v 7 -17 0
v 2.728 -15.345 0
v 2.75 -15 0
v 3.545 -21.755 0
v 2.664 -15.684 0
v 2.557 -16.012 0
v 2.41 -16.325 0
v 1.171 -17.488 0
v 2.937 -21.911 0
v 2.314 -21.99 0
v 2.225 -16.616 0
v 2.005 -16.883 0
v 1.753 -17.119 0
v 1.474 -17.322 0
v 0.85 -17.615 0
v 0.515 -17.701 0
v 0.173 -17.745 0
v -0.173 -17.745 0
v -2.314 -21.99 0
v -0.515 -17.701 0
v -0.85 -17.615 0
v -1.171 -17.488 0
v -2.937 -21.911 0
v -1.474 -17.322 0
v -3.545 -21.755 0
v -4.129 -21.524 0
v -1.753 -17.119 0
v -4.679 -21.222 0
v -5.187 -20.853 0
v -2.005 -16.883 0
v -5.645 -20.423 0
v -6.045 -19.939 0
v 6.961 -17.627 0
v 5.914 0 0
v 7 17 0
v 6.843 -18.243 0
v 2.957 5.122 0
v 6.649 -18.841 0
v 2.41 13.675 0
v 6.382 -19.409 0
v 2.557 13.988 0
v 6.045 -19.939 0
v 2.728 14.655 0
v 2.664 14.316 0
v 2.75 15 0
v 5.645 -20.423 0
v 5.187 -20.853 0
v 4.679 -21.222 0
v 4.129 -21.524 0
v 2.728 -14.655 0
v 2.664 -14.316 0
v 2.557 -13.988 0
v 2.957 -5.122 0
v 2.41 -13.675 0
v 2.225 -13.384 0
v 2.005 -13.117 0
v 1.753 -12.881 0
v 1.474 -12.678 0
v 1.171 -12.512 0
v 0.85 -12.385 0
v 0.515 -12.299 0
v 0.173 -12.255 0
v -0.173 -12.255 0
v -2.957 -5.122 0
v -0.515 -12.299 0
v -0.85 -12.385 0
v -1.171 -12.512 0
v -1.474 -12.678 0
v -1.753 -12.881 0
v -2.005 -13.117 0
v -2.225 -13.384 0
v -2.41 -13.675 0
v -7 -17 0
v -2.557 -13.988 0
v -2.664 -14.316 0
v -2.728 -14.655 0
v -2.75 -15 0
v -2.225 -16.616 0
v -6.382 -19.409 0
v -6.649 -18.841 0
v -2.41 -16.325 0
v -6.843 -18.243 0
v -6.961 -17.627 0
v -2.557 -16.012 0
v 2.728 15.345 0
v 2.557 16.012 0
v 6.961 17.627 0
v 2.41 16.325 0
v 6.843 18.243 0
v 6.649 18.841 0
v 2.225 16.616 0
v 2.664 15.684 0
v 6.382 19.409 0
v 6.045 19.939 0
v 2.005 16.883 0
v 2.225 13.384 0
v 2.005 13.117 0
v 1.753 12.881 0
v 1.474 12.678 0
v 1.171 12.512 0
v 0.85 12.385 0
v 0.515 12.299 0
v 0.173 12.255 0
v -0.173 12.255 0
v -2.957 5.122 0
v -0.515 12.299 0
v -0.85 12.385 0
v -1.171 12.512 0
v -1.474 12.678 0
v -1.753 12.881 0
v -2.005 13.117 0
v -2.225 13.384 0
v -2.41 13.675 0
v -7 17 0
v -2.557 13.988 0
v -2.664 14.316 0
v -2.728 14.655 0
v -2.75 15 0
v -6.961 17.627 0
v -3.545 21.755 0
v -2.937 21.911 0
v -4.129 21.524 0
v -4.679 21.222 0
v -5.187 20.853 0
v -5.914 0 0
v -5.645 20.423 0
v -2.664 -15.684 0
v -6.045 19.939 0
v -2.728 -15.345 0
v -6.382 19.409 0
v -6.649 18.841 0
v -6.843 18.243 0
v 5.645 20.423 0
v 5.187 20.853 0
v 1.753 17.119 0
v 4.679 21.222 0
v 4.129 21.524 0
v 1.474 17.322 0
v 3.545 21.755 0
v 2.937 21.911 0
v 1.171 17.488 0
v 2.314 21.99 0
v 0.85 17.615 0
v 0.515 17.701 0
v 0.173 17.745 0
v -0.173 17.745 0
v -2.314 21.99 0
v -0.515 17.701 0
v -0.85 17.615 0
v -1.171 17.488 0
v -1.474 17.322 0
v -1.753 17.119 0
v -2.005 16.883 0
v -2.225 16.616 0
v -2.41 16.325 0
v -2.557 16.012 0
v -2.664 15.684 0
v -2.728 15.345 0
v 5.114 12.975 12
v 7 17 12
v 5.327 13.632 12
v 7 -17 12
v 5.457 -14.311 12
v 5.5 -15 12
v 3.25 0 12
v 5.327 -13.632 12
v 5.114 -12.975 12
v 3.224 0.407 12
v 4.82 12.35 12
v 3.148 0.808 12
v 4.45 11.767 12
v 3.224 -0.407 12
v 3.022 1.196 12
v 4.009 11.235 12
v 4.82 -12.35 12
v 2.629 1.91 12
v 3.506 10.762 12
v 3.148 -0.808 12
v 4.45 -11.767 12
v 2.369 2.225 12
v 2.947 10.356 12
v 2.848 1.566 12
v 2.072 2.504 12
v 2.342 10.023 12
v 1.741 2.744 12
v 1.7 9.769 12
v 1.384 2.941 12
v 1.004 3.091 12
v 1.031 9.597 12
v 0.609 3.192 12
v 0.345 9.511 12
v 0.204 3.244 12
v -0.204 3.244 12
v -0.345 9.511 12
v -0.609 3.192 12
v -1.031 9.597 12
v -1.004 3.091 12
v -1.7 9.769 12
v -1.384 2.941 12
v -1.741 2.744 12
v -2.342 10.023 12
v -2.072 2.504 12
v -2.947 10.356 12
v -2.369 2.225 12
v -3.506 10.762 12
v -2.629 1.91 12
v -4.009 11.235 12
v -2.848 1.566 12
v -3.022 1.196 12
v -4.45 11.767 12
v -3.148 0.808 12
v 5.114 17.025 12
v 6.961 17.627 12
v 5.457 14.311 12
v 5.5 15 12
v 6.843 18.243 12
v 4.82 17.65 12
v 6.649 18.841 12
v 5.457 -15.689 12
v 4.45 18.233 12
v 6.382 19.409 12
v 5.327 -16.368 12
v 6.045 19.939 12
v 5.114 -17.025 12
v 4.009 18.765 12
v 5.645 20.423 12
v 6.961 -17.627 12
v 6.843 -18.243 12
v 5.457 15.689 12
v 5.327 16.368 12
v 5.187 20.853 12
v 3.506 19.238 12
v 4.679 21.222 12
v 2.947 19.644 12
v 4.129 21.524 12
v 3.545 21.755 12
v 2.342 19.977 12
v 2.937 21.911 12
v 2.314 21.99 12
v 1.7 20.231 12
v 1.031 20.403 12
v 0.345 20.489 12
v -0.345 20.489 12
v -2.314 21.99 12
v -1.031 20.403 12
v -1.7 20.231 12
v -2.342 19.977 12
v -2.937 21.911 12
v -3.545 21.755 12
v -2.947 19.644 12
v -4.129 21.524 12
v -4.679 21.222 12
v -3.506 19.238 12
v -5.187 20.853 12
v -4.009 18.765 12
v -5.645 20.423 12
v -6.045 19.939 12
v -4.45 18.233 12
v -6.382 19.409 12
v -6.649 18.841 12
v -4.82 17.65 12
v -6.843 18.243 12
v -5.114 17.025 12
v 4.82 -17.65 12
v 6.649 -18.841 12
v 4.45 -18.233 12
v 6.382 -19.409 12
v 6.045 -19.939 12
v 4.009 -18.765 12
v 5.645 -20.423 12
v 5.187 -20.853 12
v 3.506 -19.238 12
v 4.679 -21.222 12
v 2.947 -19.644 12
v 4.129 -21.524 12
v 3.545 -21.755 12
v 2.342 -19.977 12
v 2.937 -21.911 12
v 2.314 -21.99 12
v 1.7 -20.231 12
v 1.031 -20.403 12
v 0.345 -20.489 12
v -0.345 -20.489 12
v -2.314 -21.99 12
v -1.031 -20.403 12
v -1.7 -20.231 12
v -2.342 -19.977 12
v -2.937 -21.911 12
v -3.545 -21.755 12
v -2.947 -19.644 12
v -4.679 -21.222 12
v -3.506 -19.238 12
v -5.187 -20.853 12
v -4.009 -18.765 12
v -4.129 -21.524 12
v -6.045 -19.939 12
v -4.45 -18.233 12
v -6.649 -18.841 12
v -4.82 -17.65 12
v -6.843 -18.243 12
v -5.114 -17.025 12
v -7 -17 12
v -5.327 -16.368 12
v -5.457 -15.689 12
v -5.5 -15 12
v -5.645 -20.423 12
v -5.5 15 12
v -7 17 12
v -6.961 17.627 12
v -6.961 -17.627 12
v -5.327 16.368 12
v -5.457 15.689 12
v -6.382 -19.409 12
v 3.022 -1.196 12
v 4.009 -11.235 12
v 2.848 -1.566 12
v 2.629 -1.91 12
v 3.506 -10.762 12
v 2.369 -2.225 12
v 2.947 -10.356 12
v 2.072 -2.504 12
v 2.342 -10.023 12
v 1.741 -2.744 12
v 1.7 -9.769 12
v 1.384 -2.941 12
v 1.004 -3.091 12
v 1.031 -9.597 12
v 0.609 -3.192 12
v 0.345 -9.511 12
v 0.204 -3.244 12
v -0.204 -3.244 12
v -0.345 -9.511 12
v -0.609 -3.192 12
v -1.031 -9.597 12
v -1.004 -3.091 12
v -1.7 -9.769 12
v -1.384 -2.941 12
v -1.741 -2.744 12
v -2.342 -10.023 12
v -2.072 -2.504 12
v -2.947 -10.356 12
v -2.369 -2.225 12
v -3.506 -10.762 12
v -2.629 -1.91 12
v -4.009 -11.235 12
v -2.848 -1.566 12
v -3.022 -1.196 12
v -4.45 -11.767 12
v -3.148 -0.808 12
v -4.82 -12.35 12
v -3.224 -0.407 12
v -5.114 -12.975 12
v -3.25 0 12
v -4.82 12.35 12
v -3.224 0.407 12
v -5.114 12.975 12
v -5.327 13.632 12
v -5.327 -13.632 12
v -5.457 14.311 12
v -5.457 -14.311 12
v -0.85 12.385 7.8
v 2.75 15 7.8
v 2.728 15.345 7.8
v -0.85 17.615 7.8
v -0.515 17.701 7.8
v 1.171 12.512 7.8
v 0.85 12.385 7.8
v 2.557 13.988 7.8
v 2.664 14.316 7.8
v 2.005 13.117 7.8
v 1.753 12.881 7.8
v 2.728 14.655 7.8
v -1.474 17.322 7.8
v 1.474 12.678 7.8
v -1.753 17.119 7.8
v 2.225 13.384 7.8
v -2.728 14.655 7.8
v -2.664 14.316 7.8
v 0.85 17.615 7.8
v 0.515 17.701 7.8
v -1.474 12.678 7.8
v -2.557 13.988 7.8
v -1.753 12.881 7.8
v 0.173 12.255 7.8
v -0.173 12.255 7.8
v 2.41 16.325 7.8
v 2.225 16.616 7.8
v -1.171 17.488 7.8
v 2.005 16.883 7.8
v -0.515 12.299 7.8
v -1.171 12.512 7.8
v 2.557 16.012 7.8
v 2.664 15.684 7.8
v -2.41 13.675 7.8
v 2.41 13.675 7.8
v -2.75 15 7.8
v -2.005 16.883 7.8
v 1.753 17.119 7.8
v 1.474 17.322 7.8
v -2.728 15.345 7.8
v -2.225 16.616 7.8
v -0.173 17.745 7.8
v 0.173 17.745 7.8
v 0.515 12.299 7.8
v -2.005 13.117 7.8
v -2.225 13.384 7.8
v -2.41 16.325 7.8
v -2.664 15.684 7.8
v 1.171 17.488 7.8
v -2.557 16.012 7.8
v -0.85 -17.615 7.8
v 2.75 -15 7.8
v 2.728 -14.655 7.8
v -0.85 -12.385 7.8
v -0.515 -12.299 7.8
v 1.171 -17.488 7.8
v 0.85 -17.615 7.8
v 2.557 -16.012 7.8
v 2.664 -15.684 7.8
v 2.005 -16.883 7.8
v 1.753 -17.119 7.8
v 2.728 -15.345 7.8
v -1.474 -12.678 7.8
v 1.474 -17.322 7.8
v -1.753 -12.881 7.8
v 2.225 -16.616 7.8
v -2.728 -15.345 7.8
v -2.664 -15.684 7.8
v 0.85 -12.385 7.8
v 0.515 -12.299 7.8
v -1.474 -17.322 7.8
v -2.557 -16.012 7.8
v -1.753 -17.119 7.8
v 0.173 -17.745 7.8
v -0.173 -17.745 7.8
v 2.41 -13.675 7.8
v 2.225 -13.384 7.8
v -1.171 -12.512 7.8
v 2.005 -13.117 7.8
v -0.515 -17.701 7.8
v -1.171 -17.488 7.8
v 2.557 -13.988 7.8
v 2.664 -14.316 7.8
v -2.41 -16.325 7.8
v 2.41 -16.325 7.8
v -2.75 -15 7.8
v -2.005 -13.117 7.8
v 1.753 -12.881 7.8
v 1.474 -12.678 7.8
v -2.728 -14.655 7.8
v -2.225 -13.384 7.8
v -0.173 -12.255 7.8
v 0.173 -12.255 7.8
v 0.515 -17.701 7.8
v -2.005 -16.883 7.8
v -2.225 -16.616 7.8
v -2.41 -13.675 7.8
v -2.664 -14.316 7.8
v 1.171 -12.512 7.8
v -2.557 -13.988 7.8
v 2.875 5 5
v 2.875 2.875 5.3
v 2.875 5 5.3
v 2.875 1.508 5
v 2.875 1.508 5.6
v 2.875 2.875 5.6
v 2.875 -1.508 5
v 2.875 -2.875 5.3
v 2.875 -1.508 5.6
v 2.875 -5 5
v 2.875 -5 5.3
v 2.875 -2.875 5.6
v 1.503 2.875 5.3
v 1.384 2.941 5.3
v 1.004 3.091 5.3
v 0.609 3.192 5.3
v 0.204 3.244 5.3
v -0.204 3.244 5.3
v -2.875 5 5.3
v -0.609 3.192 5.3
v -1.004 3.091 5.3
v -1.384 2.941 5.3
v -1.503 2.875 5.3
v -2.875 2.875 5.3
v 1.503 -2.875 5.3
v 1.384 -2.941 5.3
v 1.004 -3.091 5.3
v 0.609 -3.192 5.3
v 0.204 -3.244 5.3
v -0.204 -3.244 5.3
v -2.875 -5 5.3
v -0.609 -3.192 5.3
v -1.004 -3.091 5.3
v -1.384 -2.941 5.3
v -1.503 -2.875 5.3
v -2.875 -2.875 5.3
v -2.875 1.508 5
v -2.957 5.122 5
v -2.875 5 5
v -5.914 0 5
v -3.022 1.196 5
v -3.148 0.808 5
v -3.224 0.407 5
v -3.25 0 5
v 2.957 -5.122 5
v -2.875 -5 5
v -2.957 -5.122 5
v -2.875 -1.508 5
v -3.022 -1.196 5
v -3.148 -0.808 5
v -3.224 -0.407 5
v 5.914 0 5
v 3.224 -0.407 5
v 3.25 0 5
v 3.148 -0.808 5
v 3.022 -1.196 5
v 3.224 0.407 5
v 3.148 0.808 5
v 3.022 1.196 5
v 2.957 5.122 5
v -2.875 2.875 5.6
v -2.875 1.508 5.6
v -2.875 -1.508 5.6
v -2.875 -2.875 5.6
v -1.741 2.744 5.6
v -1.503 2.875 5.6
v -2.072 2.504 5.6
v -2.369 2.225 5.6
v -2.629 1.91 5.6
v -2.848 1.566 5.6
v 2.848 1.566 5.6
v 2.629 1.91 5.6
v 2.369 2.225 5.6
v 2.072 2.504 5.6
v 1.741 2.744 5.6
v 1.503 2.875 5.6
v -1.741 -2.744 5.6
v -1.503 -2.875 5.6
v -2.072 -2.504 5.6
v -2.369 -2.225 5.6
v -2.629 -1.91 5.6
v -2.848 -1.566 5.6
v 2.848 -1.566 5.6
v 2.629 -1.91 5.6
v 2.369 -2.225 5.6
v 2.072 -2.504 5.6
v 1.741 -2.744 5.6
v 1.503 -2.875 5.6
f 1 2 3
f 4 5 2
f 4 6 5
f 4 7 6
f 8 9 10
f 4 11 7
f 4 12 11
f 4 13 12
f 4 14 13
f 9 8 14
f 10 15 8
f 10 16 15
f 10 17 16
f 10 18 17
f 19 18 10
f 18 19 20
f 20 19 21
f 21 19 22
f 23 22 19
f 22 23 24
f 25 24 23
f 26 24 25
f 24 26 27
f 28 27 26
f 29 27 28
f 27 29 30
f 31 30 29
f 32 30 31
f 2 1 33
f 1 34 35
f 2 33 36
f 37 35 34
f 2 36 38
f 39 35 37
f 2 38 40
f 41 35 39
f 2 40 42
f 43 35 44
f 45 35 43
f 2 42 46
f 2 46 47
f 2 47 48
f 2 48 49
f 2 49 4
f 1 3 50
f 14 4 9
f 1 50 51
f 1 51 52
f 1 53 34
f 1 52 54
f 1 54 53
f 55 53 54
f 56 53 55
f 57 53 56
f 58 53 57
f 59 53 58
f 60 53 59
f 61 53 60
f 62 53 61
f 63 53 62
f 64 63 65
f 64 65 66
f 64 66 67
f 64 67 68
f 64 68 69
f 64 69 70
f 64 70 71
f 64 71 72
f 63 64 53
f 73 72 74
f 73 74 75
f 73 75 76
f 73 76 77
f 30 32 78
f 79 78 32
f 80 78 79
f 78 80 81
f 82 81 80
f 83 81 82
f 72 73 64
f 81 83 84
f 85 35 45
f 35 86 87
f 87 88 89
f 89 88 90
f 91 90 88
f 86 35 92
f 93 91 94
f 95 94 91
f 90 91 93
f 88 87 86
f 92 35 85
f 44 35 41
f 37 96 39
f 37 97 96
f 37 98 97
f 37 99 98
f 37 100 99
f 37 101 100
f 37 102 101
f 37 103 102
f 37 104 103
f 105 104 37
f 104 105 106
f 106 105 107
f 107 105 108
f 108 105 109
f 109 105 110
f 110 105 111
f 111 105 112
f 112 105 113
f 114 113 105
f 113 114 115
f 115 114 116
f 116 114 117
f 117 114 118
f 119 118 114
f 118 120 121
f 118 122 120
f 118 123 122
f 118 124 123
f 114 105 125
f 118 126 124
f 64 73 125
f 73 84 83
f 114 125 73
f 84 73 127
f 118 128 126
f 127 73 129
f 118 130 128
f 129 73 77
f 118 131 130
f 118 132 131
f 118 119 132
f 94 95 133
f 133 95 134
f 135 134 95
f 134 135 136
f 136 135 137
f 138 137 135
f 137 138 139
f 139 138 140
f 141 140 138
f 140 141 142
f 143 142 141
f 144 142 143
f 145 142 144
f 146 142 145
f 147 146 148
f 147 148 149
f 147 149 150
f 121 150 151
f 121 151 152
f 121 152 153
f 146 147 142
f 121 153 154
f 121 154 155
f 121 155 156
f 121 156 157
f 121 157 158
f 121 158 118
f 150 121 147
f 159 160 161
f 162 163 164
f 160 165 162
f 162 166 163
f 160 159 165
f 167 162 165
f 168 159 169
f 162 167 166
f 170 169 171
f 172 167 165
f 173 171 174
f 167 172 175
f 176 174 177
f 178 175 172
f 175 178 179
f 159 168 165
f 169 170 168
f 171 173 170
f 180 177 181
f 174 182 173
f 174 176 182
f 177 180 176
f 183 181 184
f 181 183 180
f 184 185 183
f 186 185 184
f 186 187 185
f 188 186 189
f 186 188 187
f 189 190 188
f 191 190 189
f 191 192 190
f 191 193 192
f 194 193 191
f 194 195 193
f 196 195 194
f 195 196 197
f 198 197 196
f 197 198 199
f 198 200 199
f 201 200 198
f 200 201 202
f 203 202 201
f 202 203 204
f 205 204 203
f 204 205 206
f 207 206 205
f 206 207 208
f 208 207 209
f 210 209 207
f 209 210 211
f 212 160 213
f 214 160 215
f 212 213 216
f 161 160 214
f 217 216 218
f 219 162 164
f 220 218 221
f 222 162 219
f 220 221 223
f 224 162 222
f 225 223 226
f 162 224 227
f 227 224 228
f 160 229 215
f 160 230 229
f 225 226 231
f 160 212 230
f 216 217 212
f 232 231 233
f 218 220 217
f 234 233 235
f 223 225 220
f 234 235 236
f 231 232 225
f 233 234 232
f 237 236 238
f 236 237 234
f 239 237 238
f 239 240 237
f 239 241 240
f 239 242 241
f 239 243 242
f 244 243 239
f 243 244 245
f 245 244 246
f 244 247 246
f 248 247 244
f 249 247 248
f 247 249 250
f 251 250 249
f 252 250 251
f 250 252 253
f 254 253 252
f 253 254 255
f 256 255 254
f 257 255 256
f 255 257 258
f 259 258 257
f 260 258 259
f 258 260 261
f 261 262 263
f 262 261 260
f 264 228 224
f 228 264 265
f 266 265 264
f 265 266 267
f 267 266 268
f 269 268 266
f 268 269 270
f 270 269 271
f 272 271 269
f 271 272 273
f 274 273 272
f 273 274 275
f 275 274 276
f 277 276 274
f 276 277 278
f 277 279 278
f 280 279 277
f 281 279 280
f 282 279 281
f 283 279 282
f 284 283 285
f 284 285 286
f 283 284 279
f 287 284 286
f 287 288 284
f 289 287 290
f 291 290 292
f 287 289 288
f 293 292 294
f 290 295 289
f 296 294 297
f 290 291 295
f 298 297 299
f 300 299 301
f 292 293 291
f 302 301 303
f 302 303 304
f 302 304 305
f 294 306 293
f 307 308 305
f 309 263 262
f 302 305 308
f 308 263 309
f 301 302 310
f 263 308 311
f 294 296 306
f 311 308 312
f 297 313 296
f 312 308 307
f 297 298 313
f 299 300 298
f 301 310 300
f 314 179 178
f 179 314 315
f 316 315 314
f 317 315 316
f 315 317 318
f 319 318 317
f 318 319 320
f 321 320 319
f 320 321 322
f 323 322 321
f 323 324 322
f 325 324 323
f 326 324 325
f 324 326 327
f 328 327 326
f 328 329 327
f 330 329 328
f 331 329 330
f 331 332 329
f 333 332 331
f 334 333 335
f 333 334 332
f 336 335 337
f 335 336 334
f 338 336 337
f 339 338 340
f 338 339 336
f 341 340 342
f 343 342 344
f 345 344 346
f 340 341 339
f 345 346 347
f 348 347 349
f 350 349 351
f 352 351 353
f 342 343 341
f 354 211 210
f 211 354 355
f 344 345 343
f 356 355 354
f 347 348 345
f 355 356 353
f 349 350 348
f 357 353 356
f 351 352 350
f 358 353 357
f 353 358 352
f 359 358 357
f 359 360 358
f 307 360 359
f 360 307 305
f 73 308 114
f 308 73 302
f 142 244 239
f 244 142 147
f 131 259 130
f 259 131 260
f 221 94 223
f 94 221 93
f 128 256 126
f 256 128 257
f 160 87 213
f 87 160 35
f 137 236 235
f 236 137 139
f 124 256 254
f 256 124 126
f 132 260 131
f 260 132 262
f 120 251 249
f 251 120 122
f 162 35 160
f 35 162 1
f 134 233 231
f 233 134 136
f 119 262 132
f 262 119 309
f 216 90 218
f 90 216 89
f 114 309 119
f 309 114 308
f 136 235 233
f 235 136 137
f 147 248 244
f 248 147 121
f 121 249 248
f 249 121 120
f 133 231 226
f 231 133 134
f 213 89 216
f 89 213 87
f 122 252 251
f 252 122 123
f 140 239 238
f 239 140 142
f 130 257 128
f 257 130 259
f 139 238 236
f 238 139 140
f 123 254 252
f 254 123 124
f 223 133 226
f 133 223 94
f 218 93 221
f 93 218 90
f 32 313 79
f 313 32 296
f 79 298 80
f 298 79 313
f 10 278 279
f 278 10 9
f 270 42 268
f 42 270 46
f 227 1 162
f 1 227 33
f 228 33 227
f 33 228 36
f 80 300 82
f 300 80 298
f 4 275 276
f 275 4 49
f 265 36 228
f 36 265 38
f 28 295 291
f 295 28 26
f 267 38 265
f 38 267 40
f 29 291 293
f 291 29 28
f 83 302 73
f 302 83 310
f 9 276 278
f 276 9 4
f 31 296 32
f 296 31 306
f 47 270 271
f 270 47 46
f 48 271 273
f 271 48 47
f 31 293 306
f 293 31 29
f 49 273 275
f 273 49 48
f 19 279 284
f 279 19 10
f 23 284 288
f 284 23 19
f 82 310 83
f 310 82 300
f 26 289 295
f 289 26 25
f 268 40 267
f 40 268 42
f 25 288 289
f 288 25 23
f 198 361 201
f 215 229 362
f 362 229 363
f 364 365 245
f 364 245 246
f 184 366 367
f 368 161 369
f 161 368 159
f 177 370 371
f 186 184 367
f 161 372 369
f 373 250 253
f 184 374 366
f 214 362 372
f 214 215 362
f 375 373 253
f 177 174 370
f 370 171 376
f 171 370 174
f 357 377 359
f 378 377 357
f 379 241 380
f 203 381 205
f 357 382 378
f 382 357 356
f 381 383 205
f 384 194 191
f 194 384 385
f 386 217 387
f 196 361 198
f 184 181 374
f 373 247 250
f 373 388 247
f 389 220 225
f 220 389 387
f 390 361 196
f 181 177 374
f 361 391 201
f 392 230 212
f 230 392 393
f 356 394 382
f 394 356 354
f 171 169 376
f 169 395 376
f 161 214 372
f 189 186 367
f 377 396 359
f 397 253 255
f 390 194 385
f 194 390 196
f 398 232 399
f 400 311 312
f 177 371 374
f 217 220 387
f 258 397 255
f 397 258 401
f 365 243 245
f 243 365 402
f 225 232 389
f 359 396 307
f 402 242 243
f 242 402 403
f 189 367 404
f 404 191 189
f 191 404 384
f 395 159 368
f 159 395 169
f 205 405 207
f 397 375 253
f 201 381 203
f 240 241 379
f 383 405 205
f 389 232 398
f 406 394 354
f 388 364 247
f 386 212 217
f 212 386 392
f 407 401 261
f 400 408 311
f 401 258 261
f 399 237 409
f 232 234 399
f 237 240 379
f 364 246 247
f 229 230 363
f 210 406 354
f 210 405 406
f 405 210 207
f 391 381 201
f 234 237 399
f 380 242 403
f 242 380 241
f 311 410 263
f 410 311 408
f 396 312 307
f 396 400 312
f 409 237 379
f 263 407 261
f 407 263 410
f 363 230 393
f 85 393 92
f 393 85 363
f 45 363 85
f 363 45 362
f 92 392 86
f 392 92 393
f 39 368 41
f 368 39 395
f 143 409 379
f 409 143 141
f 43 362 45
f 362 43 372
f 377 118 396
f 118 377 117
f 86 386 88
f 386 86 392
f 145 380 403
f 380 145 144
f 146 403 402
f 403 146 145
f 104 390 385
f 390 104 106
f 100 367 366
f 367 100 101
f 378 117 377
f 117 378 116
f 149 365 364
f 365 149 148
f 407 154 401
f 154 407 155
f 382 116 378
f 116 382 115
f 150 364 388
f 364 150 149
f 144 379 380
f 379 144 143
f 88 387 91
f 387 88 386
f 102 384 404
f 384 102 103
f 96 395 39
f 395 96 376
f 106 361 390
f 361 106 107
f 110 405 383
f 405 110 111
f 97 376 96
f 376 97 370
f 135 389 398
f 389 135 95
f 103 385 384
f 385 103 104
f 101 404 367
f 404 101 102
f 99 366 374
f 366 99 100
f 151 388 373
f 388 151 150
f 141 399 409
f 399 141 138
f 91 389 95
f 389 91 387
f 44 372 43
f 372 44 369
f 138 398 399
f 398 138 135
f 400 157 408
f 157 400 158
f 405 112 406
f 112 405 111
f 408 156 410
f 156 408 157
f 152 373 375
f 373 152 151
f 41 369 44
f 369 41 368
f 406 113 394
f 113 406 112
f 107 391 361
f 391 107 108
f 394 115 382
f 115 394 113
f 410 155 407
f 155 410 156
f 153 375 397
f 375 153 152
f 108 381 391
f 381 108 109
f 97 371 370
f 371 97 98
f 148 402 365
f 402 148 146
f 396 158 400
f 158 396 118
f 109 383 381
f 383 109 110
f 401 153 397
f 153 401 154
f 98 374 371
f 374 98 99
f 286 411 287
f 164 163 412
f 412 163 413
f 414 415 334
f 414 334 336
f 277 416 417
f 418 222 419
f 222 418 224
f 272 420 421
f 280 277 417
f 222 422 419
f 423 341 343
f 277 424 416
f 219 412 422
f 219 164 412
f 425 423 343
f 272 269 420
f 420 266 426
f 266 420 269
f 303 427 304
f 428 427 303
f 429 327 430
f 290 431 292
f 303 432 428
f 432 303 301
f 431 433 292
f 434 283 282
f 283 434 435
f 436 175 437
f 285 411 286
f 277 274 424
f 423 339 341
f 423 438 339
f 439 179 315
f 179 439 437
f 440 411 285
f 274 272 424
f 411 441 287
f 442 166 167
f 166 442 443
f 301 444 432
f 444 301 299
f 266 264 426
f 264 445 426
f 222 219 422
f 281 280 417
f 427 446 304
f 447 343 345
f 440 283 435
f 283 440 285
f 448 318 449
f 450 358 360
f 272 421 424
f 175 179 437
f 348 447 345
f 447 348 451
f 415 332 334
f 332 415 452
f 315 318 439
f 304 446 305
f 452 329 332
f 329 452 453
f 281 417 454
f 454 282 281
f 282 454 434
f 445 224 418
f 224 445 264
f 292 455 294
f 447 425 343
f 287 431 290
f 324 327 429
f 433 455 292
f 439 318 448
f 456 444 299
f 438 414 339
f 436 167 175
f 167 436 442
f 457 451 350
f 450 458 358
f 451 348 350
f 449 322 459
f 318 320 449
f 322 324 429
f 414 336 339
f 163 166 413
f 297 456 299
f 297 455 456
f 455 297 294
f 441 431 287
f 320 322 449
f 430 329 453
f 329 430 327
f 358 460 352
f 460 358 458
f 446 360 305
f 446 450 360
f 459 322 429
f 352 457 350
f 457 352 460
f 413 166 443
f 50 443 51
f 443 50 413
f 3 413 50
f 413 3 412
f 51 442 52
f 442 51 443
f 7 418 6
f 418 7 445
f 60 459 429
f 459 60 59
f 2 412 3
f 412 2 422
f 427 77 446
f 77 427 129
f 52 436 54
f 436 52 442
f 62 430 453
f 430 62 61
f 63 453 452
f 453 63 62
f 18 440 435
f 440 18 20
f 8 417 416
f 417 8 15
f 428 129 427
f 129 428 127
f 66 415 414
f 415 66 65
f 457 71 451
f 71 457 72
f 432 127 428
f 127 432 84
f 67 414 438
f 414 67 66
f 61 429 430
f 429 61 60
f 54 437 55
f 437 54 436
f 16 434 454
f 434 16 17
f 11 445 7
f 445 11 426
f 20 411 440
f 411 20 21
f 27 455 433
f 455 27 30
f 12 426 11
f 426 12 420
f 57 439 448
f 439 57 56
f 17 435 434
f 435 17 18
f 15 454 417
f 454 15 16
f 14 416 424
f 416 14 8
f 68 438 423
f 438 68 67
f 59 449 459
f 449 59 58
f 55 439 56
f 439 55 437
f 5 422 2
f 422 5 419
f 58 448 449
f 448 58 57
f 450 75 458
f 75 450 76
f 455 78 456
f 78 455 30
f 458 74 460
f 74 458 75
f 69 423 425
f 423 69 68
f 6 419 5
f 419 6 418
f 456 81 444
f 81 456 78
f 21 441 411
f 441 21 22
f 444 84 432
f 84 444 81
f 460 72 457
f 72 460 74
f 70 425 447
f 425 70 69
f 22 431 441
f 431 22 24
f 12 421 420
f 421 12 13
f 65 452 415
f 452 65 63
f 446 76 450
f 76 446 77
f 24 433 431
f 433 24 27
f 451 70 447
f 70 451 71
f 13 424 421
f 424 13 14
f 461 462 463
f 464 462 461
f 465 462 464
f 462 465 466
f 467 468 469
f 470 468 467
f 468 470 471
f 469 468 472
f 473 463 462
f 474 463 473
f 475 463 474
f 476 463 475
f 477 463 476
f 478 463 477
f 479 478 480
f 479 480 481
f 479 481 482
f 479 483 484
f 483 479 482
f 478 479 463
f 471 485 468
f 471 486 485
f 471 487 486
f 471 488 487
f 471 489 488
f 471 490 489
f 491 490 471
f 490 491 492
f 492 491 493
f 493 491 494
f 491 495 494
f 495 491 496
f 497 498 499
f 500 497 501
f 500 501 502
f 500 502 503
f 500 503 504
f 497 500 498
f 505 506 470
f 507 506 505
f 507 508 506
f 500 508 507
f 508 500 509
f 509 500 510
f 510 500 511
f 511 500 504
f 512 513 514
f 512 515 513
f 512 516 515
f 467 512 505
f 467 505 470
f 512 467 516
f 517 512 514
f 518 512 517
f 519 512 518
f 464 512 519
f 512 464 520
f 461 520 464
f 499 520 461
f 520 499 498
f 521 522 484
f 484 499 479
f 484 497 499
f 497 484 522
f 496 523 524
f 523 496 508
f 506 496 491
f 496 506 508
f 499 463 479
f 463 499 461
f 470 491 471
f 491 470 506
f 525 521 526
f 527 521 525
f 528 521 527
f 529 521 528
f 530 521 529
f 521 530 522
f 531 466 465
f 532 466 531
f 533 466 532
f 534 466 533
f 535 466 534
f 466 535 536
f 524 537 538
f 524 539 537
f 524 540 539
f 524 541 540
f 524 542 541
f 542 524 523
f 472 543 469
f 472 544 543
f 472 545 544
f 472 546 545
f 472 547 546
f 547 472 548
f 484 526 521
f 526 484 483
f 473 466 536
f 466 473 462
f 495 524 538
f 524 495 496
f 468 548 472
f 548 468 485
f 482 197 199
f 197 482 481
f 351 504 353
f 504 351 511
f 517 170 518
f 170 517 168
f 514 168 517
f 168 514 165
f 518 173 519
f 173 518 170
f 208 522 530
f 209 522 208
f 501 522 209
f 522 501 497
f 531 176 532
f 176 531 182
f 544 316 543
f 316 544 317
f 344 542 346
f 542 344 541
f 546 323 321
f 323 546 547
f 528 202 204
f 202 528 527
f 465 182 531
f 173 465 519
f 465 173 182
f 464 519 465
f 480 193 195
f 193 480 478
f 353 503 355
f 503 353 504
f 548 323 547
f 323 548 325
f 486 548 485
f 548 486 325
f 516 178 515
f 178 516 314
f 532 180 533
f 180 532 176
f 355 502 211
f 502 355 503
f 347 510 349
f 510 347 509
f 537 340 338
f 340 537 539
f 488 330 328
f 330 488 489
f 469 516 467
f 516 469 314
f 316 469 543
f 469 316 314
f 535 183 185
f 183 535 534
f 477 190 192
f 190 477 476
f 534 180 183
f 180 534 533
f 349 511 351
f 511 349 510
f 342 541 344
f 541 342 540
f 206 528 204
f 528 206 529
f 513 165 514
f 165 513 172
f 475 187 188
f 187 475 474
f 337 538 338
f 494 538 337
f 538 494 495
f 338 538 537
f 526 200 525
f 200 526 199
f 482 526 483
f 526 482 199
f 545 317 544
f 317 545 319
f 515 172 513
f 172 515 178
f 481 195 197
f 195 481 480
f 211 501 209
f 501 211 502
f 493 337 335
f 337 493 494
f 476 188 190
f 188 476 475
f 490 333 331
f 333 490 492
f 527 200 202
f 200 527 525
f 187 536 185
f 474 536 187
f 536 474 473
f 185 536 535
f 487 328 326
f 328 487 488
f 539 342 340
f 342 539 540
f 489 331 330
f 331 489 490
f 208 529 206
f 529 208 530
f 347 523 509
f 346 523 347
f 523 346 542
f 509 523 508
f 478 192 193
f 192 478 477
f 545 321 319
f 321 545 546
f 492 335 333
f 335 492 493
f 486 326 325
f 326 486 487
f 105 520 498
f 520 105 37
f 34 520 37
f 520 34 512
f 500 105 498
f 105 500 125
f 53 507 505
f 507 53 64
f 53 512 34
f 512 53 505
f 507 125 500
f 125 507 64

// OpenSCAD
$fn = 50;


difference() {
	union() {
		cylinder(h = 12, r = 7.0000000000);
		translate(v = [0.0000000000, 7.5000000000, 0]) {
			hull() {
				translate(v = [-2.0000000000, 9.5000000000, 0]) {
					cylinder(h = 12, r = 5);
				}
				translate(v = [2.0000000000, 9.5000000000, 0]) {
					cylinder(h = 12, r = 5);
				}
				translate(v = [-2.0000000000, -9.5000000000, 0]) {
					cylinder(h = 12, r = 5);
				}
				translate(v = [2.0000000000, -9.5000000000, 0]) {
					cylinder(h = 12, r = 5);
				}
			}
		}
		translate(v = [0.0000000000, 7.5000000000, 0]) {
			hull() {
				translate(v = [-2.0000000000, 9.5000000000, 0]) {
					cylinder(h = 12, r = 5);
				}
				translate(v = [2.0000000000, 9.5000000000, 0]) {
					cylinder(h = 12, r = 5);
				}
				translate(v = [-2.0000000000, -9.5000000000, 0]) {
					cylinder(h = 12, r = 5);
				}
				translate(v = [2.0000000000, -9.5000000000, 0]) {
					cylinder(h = 12, r = 5);
				}
			}
		}
		translate(v = [0.0000000000, -7.5000000000, 0]) {
			hull() {
				translate(v = [-2.0000000000, 9.5000000000, 0]) {
					cylinder(h = 12, r = 5);
				}
				translate(v = [2.0000000000, 9.5000000000, 0]) {
					cylinder(h = 12, r = 5);
				}
				translate(v = [-2.0000000000, -9.5000000000, 0]) {
					cylinder(h = 12, r = 5);
				}
				translate(v = [2.0000000000, -9.5000000000, 0]) {
					cylinder(h = 12, r = 5);
				}
			}
		}
		translate(v = [0.0000000000, -7.5000000000, 0]) {
			hull() {
				translate(v = [-2.0000000000, 9.5000000000, 0]) {
					cylinder(h = 12, r = 5);
				}
				translate(v = [2.0000000000, 9.5000000000, 0]) {
					cylinder(h = 12, r = 5);
				}
				translate(v = [-2.0000000000, -9.5000000000, 0]) {
					cylinder(h = 12, r = 5);
				}
				translate(v = [2.0000000000, -9.5000000000, 0]) {
					cylinder(h = 12, r = 5);
				}
			}
		}
	}
	union() {
		translate(v = [0.0000000000, 15.0000000000, 12]) {
			rotate(a = [0, 0, 0]) {
				difference() {
					union() {
						#translate(v = [0, 0, -12.0000000000]) {
							cylinder(h = 12, r = 2.2500000000);
						}
						#translate(v = [0, 0, -4.2000000000]) {
							cylinder(h = 4.2000000000, r1 = 2.7500000000, r2 = 5.5000000000);
						}
						#translate(v = [0, 0, -12.0000000000]) {
							cylinder(h = 12, r = 2.7500000000);
						}
						#translate(v = [0, 0, -12.0000000000]) {
							cylinder(h = 12, r = 2.2500000000);
						}
					}
					union();
				}
			}
		}
		translate(v = [0.0000000000, 15.0000000000, 12]) {
			rotate(a = [0, 0, 0]) {
				difference() {
					union() {
						#translate(v = [0, 0, -12.0000000000]) {
							cylinder(h = 12, r = 2.2500000000);
						}
						#translate(v = [0, 0, -4.2000000000]) {
							cylinder(h = 4.2000000000, r1 = 2.7500000000, r2 = 5.5000000000);
						}
						#translate(v = [0, 0, -12.0000000000]) {
							cylinder(h = 12, r = 2.7500000000);
						}
						#translate(v = [0, 0, -12.0000000000]) {
							cylinder(h = 12, r = 2.2500000000);
						}
					}
					union();
				}
			}
		}
		translate(v = [0.0000000000, -15.0000000000, 12]) {
			rotate(a = [0, 0, 0]) {
				difference() {
					union() {
						#translate(v = [0, 0, -12.0000000000]) {
							cylinder(h = 12, r = 2.2500000000);
						}
						#translate(v = [0, 0, -4.2000000000]) {
							cylinder(h = 4.2000000000, r1 = 2.7500000000, r2 = 5.5000000000);
						}
						#translate(v = [0, 0, -12.0000000000]) {
							cylinder(h = 12, r = 2.7500000000);
						}
						#translate(v = [0, 0, -12.0000000000]) {
							cylinder(h = 12, r = 2.2500000000);
						}
					}
					union();
				}
			}
		}
		translate(v = [0.0000000000, -15.0000000000, 12]) {
			rotate(a = [0, 0, 0]) {
				difference() {
					union() {
						#translate(v = [0, 0, -12.0000000000]) {
							cylinder(h = 12, r = 2.2500000000);
						}
						#translate(v = [0, 0, -4.2000000000]) {
							cylinder(h = 4.2000000000, r1 = 2.7500000000, r2 = 5.5000000000);
						}
						#translate(v = [0, 0, -12.0000000000]) {
							cylinder(h = 12, r = 2.7500000000);
						}
						#translate(v = [0, 0, -12.0000000000]) {
							cylinder(h = 12, r = 2.2500000000);
						}
					}
					union();
				}
			}
		}
		translate(v = [0.0000000000, 0.0000000000, 0]) {
			rotate(a = [0, 0, 0]) {
				difference() {
					union() {
						#translate(v = [-2.8750000000, -5.0000000000, -0.3000000000]) {
							cube(size = [5.7500000000, 10, 0.3000000000]);
						}
						#translate(v = [-2.8750000000, -2.8750000000, -0.6000000000]) {
							cube(size = [5.7500000000, 5.7500000000, 0.3000000000]);
						}
						#translate(v = [-2.8750000000, -5.0000000000, 5]) {
							cube(size = [5.7500000000, 10, 0.3000000000]);
						}
						#translate(v = [-2.8750000000, -2.8750000000, 5.3000000000]) {
							cube(size = [5.7500000000, 5.7500000000, 0.3000000000]);
						}
						#translate(v = [0, 0, -100.0000000000]) {
							cylinder(h = 200, r = 3.2500000000);
						}
						#linear_extrude(height = 5) {
							polygon(points = [[5.9142500000, 0.0000000000], [2.9571250000, 5.1218907443], [-2.9571250000, 5.1218907443], [-5.9142500000, 0.0000000000], [-2.9571250000, -5.1218907443], [2.9571250000, -5.1218907443]]);
						}
						#translate(v = [-2.8750000000, -5.0000000000, -0.3000000000]) {
							cube(size = [5.7500000000, 10, 0.3000000000]);
						}
						#translate(v = [-2.8750000000, -2.8750000000, -0.6000000000]) {
							cube(size = [5.7500000000, 5.7500000000, 0.3000000000]);
						}
						#translate(v = [-2.8750000000, -5.0000000000, 5]) {
							cube(size = [5.7500000000, 10, 0.3000000000]);
						}
						#translate(v = [-2.8750000000, -2.8750000000, 5.3000000000]) {
							cube(size = [5.7500000000, 5.7500000000, 0.3000000000]);
						}
						#translate(v = [0, 0, -100.0000000000]) {
							cylinder(h = 200, r = 3.2500000000);
						}
						#translate(v = [-2.8750000000, -5.0000000000, -0.3000000000]) {
							cube(size = [5.7500000000, 10, 0.3000000000]);
						}
						#translate(v = [-2.8750000000, -2.8750000000, -0.6000000000]) {
							cube(size = [5.7500000000, 5.7500000000, 0.3000000000]);
						}
						#translate(v = [-2.8750000000, -5.0000000000, 5]) {
							cube(size = [5.7500000000, 10, 0.3000000000]);
						}
						#translate(v = [-2.8750000000, -2.8750000000, 5.3000000000]) {
							cube(size = [5.7500000000, 5.7500000000, 0.3000000000]);
						}
						#translate(v = [0, 0, -100.0000000000]) {
							cylinder(h = 200, r = 3.2500000000);
						}
					}
					union();
				}
			}
		}
		translate(v = [0, 0, -100]) {
			cylinder(h = 200, r = 3.2500000000);
		}
		translate(v = [0, 0, -100]) {
			cylinder(h = 200, r = 1.8000000000);
		}
	}
}
